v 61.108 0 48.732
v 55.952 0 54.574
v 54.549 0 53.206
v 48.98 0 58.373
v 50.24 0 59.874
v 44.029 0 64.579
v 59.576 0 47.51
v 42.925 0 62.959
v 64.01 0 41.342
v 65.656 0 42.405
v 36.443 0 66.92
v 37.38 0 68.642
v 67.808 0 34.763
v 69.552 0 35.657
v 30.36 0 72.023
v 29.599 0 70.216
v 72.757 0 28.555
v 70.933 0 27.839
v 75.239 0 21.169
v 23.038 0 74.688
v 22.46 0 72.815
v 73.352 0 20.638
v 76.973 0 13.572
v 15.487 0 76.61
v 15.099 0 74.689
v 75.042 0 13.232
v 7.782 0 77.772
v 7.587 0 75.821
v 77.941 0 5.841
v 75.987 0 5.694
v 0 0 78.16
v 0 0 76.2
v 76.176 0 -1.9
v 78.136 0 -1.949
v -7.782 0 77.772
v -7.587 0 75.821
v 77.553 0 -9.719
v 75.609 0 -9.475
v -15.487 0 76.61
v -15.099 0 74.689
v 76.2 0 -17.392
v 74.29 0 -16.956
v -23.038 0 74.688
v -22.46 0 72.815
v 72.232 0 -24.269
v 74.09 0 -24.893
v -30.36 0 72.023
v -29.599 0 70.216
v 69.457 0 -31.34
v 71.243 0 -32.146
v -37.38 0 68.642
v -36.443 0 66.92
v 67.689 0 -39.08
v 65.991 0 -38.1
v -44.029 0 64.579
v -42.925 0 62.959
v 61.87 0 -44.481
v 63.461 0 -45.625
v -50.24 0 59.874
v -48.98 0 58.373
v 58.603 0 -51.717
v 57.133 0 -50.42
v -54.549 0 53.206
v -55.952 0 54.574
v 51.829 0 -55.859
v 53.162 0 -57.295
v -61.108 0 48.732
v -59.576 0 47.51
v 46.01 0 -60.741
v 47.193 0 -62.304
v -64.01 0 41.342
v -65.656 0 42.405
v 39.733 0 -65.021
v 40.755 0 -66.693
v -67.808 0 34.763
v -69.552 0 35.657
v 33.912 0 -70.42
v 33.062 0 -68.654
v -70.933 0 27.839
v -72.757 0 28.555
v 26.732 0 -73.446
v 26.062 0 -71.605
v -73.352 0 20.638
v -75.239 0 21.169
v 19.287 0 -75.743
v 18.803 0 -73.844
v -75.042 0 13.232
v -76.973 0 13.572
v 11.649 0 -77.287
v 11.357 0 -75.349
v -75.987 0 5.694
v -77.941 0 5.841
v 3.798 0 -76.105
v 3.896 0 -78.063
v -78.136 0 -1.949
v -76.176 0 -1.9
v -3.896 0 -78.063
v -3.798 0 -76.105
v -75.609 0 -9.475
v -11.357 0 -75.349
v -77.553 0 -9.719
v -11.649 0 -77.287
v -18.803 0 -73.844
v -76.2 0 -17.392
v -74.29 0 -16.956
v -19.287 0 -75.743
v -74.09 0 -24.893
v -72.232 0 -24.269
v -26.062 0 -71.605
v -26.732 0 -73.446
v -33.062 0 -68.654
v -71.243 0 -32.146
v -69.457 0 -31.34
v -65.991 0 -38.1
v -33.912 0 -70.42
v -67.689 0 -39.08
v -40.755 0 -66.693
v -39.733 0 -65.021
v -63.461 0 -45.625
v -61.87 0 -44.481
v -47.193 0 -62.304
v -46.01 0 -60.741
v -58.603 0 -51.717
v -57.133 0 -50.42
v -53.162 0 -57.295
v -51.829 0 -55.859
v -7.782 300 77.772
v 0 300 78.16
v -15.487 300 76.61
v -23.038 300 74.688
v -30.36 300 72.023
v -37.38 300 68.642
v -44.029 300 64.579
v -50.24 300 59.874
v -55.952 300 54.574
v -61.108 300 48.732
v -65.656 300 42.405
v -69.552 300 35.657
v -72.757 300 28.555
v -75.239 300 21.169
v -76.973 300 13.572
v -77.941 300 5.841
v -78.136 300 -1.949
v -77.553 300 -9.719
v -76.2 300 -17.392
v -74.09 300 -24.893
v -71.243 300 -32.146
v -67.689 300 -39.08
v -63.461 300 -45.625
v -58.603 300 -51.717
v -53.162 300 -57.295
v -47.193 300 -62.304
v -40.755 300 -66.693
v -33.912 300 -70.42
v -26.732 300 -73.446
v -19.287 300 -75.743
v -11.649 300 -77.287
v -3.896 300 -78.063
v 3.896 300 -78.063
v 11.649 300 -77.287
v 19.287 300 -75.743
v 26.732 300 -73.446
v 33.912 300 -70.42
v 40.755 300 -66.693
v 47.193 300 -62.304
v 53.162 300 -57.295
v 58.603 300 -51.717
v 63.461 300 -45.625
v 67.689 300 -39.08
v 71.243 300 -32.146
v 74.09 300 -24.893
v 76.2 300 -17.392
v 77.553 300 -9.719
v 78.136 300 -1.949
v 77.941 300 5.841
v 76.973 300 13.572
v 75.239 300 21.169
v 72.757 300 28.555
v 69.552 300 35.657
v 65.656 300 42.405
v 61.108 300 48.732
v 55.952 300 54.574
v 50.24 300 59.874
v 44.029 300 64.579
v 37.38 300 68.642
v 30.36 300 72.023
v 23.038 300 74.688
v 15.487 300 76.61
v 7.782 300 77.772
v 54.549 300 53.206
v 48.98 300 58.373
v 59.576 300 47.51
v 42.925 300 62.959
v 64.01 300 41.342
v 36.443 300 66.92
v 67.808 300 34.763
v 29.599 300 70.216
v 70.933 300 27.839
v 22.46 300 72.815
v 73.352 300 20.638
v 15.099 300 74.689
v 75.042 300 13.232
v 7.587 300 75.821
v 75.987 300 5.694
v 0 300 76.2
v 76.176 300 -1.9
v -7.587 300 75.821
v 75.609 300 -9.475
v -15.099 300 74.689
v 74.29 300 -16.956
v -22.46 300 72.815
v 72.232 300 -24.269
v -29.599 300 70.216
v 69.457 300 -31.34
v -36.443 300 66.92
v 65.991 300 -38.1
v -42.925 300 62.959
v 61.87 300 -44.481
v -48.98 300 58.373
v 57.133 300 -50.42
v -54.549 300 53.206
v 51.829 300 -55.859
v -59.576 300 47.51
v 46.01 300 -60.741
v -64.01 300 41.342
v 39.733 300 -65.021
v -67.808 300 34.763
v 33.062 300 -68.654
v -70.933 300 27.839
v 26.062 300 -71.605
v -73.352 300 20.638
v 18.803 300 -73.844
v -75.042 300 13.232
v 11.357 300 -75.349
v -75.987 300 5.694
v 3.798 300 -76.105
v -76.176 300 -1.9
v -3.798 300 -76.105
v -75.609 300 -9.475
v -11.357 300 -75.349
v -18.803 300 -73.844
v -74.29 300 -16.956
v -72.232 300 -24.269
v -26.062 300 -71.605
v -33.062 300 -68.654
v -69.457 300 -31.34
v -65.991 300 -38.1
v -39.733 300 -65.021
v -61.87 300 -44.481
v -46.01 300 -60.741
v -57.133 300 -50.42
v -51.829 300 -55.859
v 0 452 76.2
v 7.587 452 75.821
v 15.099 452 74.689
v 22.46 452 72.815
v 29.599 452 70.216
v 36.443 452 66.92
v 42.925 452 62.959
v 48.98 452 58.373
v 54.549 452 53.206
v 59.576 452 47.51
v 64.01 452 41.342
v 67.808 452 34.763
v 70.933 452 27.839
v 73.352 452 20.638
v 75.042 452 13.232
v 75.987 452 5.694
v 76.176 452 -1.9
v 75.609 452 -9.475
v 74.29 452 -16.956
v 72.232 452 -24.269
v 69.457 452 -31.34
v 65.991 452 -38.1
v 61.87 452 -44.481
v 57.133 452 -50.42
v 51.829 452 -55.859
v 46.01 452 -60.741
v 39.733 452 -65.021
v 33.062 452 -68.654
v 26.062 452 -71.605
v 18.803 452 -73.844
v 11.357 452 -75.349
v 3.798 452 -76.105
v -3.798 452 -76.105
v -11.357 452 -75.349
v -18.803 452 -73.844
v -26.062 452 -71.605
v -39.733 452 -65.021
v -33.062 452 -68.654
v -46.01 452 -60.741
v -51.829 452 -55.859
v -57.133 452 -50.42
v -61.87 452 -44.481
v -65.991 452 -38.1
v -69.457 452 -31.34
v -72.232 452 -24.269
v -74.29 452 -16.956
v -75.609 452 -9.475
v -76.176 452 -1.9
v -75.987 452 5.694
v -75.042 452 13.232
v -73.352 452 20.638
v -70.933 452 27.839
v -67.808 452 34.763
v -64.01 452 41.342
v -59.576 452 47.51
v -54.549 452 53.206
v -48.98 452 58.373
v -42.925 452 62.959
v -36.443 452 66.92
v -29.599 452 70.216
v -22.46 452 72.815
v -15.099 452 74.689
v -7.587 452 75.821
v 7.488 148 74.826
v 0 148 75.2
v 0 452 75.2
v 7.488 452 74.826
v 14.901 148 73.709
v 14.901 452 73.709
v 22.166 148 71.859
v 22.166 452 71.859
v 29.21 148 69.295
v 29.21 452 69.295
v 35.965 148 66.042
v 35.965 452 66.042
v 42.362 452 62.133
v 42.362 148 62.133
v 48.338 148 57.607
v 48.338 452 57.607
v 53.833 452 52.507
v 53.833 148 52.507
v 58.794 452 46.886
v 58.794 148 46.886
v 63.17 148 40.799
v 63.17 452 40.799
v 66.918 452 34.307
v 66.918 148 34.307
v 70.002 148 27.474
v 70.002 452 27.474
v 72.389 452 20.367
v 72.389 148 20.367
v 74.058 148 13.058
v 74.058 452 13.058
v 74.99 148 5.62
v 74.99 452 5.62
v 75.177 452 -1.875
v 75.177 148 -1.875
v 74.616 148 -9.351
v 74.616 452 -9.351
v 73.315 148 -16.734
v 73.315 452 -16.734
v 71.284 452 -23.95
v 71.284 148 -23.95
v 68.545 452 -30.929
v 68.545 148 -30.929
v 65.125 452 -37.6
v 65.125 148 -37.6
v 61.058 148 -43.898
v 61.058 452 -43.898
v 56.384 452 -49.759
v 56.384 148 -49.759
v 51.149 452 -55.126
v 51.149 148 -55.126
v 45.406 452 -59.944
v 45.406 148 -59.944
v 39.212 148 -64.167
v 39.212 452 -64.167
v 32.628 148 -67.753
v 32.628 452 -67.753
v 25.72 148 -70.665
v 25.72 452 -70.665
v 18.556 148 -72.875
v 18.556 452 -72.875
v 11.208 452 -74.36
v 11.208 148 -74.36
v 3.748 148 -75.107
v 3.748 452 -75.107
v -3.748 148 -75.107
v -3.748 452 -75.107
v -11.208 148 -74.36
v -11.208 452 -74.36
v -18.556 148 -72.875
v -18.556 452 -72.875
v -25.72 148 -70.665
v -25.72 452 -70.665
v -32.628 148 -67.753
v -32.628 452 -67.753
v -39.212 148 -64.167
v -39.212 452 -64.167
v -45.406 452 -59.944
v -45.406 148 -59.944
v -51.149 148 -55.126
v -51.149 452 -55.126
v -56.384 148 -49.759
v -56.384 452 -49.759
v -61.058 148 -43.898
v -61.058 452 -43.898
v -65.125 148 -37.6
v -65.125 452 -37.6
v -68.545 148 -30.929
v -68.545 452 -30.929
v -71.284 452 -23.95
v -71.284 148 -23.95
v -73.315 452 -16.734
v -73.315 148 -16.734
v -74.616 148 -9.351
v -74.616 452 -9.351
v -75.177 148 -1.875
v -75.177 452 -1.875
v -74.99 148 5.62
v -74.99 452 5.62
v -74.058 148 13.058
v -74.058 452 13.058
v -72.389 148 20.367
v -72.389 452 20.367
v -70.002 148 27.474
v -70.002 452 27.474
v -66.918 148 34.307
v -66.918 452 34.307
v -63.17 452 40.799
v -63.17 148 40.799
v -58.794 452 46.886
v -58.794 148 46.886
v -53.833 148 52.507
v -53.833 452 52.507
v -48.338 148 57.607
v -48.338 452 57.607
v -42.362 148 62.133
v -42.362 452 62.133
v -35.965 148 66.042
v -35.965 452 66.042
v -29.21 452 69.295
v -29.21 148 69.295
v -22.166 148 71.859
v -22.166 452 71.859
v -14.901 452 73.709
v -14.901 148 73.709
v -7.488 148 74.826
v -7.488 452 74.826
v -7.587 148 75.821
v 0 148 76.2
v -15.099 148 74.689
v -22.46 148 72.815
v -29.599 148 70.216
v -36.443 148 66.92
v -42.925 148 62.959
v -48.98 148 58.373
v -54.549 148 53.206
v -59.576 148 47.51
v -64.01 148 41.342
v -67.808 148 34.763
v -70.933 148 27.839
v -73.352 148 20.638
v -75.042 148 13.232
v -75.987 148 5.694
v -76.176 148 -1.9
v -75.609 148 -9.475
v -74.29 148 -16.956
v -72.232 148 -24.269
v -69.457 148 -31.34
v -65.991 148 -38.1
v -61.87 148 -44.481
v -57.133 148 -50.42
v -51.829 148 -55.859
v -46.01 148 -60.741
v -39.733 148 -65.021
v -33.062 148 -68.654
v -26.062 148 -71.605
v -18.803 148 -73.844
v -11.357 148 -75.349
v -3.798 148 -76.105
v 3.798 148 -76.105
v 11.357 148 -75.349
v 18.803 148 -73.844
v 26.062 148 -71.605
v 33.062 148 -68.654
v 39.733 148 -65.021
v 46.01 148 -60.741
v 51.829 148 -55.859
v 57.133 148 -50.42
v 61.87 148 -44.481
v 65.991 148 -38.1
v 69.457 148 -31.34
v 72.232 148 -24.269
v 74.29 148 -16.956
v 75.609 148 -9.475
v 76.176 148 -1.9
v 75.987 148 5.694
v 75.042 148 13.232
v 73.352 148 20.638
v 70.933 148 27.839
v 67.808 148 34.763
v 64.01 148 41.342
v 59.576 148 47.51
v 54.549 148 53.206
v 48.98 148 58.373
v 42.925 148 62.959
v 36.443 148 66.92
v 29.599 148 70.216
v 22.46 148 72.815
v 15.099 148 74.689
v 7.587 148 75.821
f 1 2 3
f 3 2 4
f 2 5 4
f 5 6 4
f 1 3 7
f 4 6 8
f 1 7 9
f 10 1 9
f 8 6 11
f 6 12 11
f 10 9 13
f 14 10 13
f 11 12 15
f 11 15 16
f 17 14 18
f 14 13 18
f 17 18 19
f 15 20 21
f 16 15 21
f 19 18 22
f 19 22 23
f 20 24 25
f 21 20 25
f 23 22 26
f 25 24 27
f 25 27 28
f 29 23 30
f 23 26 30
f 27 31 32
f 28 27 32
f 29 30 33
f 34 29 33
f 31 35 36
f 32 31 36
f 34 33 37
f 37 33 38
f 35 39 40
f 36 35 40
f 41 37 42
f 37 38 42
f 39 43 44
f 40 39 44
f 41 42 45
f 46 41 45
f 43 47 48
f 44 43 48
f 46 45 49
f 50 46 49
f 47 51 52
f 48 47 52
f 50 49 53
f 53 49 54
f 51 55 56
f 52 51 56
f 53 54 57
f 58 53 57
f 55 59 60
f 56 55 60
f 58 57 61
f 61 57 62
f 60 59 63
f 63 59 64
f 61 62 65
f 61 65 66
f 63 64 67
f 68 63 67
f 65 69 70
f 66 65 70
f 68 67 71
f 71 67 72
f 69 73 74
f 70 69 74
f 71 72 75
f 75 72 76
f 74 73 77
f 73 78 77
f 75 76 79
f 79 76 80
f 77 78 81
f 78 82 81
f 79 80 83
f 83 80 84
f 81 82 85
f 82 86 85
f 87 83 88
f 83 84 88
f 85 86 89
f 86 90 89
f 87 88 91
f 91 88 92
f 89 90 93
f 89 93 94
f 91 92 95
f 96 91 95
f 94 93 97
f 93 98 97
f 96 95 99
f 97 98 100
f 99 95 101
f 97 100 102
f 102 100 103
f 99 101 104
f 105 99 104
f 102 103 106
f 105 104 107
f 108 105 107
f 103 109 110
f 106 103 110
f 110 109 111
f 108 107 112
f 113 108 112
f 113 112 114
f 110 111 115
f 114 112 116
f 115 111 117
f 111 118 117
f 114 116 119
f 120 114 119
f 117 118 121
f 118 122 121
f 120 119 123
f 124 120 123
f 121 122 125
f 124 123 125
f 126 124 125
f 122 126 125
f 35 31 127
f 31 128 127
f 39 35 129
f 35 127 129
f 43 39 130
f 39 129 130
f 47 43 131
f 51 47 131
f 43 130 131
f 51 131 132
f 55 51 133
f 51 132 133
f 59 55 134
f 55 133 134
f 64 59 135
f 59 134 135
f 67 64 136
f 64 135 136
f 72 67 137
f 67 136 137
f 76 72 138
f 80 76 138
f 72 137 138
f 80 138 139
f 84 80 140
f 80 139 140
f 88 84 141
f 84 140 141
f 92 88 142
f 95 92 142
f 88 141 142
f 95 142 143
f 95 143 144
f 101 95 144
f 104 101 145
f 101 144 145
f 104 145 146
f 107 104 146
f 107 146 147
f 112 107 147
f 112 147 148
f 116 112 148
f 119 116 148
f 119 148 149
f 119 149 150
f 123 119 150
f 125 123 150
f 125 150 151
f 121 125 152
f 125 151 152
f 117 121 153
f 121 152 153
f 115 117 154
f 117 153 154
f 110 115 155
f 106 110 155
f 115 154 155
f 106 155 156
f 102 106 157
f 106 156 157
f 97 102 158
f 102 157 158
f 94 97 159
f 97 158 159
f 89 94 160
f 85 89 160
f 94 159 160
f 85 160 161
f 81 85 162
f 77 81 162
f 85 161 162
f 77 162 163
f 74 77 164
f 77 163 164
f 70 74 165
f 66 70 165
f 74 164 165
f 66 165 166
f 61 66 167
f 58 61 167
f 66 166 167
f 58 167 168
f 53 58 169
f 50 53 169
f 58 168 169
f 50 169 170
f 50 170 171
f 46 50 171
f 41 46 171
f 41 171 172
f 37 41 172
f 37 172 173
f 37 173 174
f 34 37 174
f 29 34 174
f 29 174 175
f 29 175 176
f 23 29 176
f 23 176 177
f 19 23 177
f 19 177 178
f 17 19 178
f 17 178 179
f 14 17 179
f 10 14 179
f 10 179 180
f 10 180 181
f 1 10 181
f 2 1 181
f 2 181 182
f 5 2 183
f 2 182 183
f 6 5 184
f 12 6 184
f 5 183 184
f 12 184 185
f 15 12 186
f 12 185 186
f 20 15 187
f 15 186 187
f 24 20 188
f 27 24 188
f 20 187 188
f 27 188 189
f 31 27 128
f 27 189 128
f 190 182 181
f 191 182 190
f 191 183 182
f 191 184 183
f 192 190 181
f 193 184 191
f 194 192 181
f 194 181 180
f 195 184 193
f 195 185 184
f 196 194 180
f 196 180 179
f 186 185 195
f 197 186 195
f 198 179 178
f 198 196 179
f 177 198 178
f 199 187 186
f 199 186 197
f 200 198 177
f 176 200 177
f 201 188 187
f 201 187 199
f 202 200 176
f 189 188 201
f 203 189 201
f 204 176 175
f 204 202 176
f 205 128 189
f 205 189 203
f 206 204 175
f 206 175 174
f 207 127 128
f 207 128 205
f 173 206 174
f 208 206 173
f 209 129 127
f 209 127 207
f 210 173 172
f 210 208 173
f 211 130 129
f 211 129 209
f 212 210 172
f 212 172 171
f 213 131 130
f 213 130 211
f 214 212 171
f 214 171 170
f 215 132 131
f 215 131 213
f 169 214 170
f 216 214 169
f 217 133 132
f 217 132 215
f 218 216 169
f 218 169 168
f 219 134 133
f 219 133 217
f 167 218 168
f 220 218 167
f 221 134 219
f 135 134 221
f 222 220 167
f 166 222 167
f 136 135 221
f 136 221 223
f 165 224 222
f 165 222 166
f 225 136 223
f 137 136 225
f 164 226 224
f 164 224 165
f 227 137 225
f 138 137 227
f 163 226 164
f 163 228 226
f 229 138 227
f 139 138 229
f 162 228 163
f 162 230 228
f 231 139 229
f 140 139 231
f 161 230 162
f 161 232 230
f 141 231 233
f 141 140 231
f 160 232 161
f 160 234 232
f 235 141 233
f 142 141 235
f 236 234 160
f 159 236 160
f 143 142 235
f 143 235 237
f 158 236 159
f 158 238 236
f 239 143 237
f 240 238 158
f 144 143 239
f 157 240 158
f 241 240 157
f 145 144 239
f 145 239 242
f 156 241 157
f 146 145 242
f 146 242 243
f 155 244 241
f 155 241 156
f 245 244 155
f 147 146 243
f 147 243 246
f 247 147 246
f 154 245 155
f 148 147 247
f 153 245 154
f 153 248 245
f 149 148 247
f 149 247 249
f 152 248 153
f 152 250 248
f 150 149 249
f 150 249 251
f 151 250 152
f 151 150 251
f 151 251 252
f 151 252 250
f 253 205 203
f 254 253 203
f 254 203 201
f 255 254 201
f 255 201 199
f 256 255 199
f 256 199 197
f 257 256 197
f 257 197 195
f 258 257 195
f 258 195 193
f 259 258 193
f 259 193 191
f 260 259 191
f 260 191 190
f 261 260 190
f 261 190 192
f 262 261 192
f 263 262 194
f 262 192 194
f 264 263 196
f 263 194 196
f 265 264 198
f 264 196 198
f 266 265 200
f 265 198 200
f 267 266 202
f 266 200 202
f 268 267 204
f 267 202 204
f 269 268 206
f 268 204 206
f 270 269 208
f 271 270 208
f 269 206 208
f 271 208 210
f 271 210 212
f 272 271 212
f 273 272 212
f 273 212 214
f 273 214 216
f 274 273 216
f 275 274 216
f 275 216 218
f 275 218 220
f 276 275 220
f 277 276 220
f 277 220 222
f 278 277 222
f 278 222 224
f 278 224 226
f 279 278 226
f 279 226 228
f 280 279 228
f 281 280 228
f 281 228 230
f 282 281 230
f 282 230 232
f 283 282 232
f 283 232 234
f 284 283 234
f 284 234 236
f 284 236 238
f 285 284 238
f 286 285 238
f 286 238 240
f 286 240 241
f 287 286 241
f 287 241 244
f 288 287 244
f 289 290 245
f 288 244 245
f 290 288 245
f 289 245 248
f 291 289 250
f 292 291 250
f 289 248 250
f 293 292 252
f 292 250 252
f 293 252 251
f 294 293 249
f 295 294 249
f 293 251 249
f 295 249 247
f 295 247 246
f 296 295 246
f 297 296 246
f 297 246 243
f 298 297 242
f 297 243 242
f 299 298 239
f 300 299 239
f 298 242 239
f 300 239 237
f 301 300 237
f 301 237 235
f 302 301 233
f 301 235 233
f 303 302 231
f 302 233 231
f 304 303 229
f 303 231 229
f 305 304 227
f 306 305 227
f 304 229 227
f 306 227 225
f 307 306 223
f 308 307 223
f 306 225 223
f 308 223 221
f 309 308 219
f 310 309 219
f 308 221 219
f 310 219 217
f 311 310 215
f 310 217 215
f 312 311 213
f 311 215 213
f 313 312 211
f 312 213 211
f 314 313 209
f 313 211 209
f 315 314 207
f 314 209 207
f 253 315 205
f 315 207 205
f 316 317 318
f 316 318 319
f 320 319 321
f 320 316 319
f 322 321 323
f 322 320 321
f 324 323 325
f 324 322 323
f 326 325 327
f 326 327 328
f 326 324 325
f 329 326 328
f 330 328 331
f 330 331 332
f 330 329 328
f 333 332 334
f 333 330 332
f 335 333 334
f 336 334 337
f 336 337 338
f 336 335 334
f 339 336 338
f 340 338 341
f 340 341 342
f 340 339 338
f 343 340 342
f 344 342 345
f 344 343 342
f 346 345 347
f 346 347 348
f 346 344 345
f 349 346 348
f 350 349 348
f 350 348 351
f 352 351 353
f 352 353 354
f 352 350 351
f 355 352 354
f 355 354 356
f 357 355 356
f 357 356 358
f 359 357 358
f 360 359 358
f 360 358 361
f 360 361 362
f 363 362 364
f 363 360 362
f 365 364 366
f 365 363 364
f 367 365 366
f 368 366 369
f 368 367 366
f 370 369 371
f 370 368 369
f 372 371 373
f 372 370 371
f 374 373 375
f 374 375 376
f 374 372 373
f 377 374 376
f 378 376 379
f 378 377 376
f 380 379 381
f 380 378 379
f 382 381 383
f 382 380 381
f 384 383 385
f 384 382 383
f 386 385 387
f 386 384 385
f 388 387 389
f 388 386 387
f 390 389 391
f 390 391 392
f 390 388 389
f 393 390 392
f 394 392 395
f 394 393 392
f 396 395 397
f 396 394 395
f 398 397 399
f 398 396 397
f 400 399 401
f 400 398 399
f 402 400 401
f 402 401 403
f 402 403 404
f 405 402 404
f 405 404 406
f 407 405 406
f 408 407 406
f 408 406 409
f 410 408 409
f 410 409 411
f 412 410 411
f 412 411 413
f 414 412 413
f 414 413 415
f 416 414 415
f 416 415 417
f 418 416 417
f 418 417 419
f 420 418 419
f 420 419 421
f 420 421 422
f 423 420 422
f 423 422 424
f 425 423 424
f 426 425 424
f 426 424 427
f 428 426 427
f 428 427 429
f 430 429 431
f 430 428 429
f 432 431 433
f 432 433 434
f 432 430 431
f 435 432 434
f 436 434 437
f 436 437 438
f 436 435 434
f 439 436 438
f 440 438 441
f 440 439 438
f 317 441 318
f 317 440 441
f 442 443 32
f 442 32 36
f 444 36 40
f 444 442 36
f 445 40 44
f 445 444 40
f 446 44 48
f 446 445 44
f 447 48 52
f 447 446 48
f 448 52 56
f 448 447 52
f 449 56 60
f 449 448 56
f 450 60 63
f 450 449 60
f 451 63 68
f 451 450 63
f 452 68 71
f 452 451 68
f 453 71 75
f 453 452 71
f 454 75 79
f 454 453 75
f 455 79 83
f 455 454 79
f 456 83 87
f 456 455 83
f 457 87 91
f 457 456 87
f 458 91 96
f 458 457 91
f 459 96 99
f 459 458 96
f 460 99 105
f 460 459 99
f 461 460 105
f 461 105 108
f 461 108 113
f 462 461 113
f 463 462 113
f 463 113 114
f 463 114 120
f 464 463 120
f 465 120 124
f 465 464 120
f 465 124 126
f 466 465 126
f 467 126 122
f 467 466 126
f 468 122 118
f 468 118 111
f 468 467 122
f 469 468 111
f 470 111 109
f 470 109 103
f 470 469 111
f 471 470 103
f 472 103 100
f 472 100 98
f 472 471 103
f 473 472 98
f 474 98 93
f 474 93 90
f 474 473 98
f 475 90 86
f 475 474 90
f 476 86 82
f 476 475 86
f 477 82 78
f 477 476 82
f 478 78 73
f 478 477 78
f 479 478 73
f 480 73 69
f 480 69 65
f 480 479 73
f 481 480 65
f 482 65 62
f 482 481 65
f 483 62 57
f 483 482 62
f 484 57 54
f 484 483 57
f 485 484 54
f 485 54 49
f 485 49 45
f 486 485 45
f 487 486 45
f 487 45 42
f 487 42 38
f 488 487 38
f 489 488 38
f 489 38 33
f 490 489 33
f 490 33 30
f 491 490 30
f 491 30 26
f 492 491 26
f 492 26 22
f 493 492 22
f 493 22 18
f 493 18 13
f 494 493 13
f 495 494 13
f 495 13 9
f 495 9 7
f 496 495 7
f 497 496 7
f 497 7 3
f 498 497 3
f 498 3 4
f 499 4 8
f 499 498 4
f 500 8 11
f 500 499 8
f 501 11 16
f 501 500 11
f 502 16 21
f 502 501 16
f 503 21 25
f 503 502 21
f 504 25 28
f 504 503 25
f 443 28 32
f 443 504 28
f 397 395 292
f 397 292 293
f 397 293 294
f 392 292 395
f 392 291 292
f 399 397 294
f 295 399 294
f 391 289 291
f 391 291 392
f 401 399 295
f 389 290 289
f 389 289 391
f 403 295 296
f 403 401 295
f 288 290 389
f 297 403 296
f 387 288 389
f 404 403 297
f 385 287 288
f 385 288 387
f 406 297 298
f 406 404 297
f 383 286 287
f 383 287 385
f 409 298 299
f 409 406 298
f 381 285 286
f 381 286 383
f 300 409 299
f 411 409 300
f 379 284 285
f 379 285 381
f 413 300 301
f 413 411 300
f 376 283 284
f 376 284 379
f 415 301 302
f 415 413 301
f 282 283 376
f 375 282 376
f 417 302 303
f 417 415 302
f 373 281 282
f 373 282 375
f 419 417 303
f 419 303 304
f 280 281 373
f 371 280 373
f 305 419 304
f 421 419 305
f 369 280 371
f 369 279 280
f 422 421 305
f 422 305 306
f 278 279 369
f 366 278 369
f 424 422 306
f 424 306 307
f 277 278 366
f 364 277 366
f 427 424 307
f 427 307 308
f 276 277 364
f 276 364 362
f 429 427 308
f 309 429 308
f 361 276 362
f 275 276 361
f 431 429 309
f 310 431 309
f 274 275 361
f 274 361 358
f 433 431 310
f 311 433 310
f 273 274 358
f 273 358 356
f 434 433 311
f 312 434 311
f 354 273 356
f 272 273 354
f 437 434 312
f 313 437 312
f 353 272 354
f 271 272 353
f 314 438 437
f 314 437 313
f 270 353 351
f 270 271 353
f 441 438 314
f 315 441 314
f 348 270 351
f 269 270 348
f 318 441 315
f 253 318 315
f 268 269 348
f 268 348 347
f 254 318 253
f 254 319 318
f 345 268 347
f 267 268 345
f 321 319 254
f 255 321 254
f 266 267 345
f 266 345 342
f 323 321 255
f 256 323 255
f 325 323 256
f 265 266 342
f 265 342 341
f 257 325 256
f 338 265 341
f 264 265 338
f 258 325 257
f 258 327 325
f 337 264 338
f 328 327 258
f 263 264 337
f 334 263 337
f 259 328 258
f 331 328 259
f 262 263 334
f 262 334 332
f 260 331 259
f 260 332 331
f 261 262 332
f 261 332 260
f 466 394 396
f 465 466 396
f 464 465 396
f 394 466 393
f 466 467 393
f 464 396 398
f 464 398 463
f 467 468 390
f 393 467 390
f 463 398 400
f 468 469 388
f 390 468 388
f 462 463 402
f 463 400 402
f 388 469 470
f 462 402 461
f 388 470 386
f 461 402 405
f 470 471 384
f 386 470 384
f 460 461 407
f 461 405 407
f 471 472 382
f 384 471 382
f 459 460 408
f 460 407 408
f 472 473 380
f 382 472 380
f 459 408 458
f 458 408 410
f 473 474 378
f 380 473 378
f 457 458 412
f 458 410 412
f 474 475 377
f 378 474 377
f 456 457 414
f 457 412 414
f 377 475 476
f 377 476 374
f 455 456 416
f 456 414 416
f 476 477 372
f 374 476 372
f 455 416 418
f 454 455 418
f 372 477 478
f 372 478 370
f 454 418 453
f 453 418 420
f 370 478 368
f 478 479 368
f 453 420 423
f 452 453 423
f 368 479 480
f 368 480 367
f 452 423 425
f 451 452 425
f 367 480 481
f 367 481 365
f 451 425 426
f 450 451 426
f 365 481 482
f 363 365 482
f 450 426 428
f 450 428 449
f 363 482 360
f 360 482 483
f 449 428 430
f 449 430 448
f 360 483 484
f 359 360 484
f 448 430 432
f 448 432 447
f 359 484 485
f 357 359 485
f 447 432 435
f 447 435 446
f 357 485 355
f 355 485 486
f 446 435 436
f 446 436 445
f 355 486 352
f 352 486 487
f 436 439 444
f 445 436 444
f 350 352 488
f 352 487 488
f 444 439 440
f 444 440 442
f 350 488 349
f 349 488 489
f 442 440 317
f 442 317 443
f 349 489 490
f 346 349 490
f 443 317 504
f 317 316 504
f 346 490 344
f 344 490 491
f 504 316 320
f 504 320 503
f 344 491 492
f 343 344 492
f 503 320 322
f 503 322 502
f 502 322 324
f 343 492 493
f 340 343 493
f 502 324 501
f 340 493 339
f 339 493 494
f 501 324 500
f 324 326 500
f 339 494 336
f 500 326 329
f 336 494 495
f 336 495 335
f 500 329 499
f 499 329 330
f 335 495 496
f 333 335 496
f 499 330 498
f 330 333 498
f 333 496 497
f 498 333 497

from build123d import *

# Parameters (mm, degrees)
SKETCH1_W                = 1.96
SKETCH1_H                = 300
BOSS_EXTRUDE1_DEPTH      = 152
BOSS_EXTRUDE1_DEPTH_BACK = 152
SKETCH3_R                = 76.2
SKETCH3_R_2              = 75.2


with BuildPart() as part:
    # Sketch1 → Revolve1 (revolve)
    with BuildSketch(Plane.XY, mode=Mode.PRIVATE) as revolve1_sk:
        with Locations((77.18, 150)):
            Rectangle(SKETCH1_W, SKETCH1_H)
    revolve(revolve1_sk.sketch.rotate(Axis((0, 204.615384615, 0), (0, -1, 0)), 90), axis=Axis((0, 204.615384615, 0), (0, -1, 0)))

    # Sketch3 → Boss-Extrude1 (add, two sides: drawn at the far end of the back side and taken through both)
    with BuildSketch(Plane(origin=(0, 300, 0), x_dir=(1, 0, 0), z_dir=(0, 1, 0)).offset(-BOSS_EXTRUDE1_DEPTH_BACK)):
        with Locations(Location((0, 0, 0), (0, 0, 270))):
            Circle(SKETCH3_R)
        with Locations(Location((0, 0, 0), (0, 0, 270))):
            Circle(SKETCH3_R_2, mode=Mode.SUBTRACT)
    extrude(amount=BOSS_EXTRUDE1_DEPTH + BOSS_EXTRUDE1_DEPTH_BACK)


solid = part.part
